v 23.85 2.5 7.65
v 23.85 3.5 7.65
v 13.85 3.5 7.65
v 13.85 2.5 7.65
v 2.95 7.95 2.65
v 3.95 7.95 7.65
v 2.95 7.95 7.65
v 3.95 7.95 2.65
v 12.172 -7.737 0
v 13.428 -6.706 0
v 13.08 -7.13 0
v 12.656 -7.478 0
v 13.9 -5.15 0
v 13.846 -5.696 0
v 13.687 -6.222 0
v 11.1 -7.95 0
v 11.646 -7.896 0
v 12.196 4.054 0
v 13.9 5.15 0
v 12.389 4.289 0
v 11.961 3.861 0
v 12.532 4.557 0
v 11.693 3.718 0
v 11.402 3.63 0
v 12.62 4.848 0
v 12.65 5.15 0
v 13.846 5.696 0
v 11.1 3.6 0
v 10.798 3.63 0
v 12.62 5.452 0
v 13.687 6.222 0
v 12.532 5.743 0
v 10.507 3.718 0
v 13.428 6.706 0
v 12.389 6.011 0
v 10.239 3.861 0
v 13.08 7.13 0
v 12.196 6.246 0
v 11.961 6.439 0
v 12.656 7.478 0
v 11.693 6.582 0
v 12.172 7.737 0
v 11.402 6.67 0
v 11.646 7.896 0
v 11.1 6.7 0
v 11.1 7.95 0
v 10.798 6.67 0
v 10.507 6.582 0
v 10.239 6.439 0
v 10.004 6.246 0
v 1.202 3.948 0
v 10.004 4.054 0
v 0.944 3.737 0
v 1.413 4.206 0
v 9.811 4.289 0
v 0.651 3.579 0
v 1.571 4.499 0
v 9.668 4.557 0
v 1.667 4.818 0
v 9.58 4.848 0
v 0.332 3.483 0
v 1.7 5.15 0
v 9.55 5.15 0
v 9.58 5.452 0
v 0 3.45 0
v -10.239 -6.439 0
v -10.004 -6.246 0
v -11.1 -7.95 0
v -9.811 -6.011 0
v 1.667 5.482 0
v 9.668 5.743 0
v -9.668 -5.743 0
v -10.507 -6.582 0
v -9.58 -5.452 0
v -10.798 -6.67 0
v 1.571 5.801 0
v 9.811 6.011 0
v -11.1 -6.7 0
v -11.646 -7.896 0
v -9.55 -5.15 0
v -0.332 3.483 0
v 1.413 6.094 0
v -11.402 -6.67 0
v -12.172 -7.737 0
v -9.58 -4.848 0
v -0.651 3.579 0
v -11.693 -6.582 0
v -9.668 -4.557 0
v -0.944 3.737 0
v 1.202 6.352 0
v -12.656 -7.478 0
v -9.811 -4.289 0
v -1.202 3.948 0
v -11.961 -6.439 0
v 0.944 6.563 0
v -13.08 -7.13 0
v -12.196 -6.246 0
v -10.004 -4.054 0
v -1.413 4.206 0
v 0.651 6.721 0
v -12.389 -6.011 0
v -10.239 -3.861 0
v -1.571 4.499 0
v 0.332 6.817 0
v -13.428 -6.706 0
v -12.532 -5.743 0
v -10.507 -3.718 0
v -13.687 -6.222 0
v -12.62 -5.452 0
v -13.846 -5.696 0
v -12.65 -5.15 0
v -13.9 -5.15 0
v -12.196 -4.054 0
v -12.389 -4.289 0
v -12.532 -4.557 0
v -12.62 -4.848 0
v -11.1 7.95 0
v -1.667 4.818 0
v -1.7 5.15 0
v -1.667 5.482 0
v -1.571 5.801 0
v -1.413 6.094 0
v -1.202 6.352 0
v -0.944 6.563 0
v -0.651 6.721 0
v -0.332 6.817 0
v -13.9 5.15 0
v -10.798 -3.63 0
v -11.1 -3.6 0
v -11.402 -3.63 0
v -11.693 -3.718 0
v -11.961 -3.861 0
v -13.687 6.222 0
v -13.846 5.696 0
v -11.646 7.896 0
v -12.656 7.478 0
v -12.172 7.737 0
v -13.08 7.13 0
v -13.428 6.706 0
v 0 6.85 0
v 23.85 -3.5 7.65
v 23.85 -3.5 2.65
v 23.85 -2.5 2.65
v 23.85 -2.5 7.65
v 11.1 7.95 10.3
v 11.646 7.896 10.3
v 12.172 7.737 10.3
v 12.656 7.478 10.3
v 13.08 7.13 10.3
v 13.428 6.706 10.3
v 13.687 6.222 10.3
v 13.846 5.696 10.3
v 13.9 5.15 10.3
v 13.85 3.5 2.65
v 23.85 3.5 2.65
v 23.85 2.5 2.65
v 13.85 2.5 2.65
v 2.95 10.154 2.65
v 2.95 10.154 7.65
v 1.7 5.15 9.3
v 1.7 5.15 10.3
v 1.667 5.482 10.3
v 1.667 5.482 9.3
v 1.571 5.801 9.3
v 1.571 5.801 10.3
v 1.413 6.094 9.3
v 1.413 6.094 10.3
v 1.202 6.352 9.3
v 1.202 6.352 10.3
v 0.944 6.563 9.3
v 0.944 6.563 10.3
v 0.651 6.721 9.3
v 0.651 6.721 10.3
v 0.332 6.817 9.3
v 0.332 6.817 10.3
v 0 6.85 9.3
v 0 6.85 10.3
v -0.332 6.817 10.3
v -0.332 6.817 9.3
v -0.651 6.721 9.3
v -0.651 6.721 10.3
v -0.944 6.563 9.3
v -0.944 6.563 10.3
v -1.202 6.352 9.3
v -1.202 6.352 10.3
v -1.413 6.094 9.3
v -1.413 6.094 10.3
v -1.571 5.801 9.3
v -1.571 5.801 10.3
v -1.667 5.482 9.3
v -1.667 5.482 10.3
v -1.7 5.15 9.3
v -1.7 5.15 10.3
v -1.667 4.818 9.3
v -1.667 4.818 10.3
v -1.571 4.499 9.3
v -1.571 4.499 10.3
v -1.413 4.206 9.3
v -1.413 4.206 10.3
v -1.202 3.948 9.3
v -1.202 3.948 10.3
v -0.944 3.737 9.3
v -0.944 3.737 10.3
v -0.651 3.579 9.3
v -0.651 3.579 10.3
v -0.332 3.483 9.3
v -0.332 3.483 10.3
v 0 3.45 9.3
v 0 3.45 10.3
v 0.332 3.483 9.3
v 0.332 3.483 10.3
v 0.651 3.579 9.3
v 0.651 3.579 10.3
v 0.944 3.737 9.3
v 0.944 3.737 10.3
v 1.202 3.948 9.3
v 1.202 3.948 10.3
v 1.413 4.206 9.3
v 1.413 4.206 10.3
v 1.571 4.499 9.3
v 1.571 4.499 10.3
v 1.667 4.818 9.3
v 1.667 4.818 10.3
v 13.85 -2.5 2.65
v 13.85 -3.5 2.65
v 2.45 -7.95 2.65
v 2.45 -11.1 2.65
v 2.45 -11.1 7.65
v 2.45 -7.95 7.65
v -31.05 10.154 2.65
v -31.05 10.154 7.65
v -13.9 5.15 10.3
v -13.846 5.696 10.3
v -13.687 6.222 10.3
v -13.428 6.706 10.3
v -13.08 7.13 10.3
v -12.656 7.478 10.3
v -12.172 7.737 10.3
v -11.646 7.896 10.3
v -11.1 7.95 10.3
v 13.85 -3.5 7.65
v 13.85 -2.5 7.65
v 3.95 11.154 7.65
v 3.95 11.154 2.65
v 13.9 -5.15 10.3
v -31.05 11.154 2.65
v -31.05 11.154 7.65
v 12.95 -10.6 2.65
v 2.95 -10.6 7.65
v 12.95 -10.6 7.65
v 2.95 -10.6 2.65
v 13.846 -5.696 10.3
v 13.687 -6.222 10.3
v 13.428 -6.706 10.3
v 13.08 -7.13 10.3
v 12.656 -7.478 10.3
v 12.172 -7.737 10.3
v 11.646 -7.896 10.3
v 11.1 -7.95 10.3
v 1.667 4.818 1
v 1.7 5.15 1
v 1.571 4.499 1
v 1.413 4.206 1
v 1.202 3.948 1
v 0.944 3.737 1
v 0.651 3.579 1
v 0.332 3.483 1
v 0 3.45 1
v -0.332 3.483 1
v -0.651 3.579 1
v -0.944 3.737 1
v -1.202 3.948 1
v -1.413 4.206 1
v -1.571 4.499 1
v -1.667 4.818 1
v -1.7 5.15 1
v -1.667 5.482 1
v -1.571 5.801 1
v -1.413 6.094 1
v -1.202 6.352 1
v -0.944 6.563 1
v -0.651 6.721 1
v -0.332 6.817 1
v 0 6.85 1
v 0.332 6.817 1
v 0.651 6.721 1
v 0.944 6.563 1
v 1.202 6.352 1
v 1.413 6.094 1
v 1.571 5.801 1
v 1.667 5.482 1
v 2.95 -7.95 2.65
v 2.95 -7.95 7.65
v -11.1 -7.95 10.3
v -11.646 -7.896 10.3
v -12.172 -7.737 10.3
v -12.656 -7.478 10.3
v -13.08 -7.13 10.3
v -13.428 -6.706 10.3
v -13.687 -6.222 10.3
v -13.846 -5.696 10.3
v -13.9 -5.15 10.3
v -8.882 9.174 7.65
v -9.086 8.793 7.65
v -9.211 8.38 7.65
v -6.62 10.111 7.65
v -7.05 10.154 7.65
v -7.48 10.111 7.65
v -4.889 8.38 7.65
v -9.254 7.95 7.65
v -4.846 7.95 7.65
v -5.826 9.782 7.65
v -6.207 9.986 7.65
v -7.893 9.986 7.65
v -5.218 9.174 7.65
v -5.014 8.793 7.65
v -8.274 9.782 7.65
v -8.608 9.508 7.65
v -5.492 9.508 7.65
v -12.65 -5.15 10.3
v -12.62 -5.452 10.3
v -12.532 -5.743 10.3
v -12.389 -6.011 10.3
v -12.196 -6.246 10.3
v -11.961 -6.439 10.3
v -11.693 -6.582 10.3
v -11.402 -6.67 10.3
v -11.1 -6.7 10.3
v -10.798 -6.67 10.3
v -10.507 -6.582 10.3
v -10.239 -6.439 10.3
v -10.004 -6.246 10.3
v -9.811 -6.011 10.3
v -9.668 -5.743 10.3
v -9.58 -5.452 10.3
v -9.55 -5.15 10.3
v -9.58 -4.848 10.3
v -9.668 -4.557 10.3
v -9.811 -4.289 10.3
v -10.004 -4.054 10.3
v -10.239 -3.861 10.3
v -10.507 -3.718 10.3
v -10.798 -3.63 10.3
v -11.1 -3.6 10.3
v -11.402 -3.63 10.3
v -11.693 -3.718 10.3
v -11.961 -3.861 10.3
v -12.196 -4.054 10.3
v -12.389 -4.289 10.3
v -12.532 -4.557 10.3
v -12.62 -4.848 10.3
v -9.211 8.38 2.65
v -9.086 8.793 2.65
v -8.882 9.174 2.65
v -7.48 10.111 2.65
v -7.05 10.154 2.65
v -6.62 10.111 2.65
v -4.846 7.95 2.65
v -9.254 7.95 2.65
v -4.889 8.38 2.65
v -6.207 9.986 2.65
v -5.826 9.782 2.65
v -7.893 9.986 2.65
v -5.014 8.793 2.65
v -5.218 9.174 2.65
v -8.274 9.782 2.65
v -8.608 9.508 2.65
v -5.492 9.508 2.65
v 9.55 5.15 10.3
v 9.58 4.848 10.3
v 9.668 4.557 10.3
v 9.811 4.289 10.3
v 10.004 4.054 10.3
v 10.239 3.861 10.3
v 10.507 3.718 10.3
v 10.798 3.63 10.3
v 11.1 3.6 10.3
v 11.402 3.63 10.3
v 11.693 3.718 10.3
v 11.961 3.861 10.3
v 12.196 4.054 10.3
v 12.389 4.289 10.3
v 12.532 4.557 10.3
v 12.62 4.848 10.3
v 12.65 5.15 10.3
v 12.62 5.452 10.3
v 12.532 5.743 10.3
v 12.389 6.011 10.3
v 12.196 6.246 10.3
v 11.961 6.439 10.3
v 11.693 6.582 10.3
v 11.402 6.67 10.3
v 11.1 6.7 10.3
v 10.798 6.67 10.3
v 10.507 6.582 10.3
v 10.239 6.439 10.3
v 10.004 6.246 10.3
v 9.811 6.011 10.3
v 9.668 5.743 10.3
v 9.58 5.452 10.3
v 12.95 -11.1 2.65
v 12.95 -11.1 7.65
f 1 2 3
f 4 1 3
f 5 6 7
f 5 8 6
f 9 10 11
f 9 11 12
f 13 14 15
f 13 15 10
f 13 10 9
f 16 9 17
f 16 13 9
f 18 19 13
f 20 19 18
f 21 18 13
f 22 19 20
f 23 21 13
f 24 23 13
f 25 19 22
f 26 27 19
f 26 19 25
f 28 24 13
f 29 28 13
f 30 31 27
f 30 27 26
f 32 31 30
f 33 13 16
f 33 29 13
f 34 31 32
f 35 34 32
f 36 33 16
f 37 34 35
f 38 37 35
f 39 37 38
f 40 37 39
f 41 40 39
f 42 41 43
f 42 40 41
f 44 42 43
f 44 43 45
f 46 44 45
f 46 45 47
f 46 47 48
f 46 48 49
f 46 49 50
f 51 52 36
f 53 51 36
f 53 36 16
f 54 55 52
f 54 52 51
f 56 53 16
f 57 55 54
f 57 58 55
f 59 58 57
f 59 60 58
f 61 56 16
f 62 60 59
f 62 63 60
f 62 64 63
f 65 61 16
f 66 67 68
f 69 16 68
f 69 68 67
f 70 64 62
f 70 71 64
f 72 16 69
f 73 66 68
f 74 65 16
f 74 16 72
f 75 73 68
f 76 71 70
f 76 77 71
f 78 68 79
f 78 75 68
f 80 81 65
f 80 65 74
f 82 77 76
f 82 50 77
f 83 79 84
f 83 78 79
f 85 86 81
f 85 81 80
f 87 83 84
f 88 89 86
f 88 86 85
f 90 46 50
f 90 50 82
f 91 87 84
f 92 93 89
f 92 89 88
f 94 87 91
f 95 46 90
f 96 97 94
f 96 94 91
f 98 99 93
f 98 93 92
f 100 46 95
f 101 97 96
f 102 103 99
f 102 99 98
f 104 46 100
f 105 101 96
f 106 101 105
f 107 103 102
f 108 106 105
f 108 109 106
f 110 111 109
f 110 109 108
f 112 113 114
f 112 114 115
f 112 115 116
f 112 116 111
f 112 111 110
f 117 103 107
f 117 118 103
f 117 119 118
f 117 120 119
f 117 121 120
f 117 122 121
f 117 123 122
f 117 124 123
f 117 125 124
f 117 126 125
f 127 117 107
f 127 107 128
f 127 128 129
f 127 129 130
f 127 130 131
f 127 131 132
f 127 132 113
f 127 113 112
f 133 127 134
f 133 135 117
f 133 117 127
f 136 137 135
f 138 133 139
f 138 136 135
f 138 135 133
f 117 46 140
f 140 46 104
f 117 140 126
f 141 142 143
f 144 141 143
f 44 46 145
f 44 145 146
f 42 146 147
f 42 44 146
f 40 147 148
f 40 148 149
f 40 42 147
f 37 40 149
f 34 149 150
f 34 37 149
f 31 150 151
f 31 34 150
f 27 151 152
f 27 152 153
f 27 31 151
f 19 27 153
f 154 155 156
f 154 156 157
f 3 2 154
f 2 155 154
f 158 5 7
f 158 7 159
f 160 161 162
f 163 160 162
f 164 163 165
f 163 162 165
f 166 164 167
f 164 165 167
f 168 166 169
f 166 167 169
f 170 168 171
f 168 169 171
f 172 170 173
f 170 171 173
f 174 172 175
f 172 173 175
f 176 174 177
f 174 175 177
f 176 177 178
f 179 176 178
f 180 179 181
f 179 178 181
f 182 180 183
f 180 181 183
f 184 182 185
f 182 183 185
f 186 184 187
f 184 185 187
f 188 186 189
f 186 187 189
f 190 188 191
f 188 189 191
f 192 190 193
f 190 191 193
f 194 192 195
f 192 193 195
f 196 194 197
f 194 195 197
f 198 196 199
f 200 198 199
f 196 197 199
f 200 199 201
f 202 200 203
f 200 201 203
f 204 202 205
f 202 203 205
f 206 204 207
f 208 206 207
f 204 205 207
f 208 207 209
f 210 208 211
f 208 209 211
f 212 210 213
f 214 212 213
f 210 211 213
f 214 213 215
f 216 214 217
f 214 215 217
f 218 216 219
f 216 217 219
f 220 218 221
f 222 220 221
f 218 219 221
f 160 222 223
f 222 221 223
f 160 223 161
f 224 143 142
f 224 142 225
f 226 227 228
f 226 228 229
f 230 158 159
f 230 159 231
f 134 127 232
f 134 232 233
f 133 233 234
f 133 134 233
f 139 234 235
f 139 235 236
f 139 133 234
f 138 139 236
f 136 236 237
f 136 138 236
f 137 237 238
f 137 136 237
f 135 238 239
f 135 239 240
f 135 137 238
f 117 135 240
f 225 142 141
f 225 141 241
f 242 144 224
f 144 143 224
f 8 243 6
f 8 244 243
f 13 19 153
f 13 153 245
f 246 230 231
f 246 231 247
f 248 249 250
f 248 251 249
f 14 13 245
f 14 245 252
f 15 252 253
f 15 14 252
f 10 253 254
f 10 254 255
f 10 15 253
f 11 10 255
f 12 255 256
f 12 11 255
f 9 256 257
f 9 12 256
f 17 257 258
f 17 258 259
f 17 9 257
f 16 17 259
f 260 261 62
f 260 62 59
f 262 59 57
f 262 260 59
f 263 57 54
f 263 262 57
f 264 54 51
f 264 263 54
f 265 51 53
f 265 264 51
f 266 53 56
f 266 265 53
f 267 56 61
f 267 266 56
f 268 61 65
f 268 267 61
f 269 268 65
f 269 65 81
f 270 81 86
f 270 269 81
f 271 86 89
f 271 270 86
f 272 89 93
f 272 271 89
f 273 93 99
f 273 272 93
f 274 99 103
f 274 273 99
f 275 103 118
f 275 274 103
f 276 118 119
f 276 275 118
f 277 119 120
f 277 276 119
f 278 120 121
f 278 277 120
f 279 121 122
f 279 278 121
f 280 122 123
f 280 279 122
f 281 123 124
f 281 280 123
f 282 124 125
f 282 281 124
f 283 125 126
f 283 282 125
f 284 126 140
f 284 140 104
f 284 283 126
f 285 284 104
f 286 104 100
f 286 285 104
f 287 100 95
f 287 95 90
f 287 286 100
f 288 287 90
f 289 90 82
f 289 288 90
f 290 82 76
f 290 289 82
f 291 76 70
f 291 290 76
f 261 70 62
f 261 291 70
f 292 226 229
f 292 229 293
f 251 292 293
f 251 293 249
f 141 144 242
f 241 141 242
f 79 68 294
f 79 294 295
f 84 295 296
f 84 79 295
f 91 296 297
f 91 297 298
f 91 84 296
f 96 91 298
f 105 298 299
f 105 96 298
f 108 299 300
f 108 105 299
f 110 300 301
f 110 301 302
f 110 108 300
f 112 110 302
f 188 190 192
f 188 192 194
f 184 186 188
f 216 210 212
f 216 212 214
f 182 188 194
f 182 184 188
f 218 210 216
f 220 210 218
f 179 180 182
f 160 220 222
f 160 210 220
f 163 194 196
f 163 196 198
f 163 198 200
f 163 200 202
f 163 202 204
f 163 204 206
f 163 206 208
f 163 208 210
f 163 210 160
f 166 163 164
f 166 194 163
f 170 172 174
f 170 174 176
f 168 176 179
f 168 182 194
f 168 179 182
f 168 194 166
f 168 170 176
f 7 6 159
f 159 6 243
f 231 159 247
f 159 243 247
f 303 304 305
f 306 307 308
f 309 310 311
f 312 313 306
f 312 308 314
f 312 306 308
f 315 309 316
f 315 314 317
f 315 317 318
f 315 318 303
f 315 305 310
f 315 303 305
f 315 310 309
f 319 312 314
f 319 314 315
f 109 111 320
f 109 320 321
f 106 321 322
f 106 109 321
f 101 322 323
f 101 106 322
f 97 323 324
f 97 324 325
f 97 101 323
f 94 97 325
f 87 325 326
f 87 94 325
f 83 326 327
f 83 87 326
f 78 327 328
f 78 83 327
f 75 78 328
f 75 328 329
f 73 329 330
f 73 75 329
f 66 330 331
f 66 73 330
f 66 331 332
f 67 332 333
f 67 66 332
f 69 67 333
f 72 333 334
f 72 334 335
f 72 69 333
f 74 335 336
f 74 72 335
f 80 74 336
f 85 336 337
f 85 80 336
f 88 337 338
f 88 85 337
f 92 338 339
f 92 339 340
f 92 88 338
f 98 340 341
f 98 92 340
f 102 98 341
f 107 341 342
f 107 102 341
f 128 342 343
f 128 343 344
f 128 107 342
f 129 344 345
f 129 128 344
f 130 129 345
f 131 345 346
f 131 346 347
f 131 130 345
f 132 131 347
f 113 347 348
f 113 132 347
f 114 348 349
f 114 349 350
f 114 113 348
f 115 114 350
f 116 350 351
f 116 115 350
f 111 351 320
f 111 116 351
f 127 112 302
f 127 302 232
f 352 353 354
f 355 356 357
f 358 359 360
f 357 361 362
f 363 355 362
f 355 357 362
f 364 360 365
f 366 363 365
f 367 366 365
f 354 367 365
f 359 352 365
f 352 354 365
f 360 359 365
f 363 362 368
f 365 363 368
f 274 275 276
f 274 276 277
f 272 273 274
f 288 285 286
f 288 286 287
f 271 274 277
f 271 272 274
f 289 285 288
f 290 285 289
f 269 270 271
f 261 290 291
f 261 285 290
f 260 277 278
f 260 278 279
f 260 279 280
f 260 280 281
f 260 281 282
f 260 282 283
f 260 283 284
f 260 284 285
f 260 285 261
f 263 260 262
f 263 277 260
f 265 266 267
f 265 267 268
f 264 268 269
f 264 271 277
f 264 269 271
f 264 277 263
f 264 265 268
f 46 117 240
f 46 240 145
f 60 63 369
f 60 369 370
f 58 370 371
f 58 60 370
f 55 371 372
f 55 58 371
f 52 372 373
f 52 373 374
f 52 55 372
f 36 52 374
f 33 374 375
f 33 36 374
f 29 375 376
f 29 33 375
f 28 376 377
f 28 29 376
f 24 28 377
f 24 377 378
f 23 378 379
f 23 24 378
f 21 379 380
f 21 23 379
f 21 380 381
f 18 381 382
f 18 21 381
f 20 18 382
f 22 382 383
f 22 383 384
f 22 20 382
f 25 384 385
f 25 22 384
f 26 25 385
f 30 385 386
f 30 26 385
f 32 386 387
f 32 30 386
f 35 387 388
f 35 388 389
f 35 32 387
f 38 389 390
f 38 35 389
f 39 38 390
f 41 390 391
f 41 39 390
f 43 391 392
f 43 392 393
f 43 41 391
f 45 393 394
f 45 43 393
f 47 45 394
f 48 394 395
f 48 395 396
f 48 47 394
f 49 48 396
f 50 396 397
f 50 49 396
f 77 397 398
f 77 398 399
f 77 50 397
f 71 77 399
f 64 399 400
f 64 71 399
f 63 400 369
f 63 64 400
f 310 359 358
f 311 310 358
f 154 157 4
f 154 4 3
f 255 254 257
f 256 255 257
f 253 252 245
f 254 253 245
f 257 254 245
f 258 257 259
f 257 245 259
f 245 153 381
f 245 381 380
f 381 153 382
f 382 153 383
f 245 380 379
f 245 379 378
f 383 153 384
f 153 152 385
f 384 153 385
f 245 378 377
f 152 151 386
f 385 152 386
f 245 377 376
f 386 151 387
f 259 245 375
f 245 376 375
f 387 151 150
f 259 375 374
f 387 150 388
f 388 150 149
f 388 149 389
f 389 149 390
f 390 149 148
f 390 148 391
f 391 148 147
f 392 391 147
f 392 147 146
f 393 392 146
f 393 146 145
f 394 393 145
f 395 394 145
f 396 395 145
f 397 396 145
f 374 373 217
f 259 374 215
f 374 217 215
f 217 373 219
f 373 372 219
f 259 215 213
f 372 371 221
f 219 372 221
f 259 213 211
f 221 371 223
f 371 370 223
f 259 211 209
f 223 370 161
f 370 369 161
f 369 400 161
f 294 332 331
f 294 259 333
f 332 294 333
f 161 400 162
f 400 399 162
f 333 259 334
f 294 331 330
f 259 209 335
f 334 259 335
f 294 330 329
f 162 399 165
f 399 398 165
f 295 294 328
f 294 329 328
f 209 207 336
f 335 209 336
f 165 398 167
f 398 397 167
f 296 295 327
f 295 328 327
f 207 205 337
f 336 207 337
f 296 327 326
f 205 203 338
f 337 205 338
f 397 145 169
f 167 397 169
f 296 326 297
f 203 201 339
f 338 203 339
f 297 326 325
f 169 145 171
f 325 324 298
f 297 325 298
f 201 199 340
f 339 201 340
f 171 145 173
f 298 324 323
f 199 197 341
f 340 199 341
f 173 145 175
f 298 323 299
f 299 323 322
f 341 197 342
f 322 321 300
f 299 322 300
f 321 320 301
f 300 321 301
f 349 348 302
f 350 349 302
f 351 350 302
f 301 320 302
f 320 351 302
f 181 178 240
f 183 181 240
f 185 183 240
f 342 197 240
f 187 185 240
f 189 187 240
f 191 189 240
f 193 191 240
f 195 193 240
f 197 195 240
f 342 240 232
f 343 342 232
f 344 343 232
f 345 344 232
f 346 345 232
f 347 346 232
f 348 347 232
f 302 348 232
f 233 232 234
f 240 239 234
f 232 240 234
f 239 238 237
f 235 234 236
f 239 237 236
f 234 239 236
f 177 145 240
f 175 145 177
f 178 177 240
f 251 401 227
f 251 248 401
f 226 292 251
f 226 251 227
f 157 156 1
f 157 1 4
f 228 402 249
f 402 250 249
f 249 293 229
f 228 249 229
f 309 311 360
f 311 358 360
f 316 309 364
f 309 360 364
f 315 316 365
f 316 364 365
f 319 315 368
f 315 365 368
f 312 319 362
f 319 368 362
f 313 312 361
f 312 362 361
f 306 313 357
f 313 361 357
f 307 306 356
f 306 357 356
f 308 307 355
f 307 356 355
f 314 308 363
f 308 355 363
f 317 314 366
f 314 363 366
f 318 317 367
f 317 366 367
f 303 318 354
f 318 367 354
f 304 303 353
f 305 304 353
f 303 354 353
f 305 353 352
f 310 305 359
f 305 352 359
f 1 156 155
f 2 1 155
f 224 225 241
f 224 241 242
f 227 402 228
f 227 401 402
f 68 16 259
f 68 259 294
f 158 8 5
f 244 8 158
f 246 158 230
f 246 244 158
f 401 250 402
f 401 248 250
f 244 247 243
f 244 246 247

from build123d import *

# Parameters (mm, degrees)
CROQUIS1_R                = 1.55
SALIENTE_EXTRUIR1_DEPTH   = 10.3
CROQUIS2_R                = 1.7
CORTAR_EXTRUIR1_DEPTH     = 1
CORTAR_EXTRUIR2_START     = -1
CROQUIS3_R                = 1.7
CORTAR_EXTRUIR2_DEPTH     = 1
SALIENTE_EXTRUIR2_DEPTH   = 2.5
SALIENTE_EXTRUIR2_2_DEPTH = 2.5
CROQUIS4_W                = 10
CROQUIS4_H                = 1
SALIENTE_EXTRUIR2_3_DEPTH = 2.5
SALIENTE_EXTRUIR2_4_DEPTH = 2.5
SALIENTE_EXTRUIR2_5_DEPTH = 2.5


with BuildPart() as part:
    # Croquis1 → Saliente-Extruir1 (new body)
    with BuildSketch(Plane.XY):
        with BuildLine():
            Line((-11.1, 7.95), (11.1, 7.95))
            ThreePointArc((11.1, 7.95), (13.079898987, 7.129898987), (13.9, 5.15))
            Line((13.9, 5.15), (13.9, -5.15))
            ThreePointArc((13.9, -5.15), (13.079898987, -7.129898987), (11.1, -7.95))
            Line((11.1, -7.95), (-11.1, -7.95))
            ThreePointArc((-11.1, -7.95), (-13.079898987, -7.129898987), (-13.9, -5.15))
            Line((-13.9, -5.15), (-13.9, 5.15))
            ThreePointArc((-13.9, 5.15), (-13.079898987, 7.129898987), (-11.1, 7.95))
        make_face()
        with Locations(Location((11.1, 5.15, 0), (0, 0, 180))):
            Circle(CROQUIS1_R, mode=Mode.SUBTRACT)
        with Locations(Location((-11.1, -5.15, 0), (0, 0, 180))):
            Circle(CROQUIS1_R, mode=Mode.SUBTRACT)
    extrude(amount=SALIENTE_EXTRUIR1_DEPTH)

    # Croquis2 → Cortar-Extruir1 (cut)
    with BuildSketch(Plane.XY.offset(10.3)):
        with Locations((0, 5.15)):
            Circle(CROQUIS2_R)
    extrude(amount=-CORTAR_EXTRUIR1_DEPTH, mode=Mode.SUBTRACT)

    # Croquis3 → Cortar-Extruir2 (cut)
    with BuildSketch(Plane(origin=(0, 0, 0), x_dir=(-1, 0, 0), z_dir=(0, 0, -1)).offset(CORTAR_EXTRUIR2_START)):
        with Locations(Location((0, 5.15, 0), (0, 0, 180))):
            Circle(CROQUIS3_R)
    extrude(amount=CORTAR_EXTRUIR2_DEPTH, mode=Mode.SUBTRACT)


with BuildPart() as body_2:
    # Croquis4 → Saliente-Extruir2 (new, symmetric)
    with BuildSketch(Plane(origin=(0, 0, 5.15), x_dir=(-1, 0, 0), z_dir=(0, 0, -1))):
        Polygon((-3.95, 7.95), (-2.95, 7.95), (-2.95, 10.153629865), (31.05, 10.153629865), (31.05, 11.153629865), (-3.95, 11.153629865), align=None)
    extrude(amount=SALIENTE_EXTRUIR2_DEPTH, both=True)


with BuildPart() as body_3:
    # Croquis4 → Saliente-Extruir2 2 (new, symmetric)
    with BuildSketch(Plane(origin=(0, 0, 5.15), x_dir=(-1, 0, 0), z_dir=(0, 0, -1))):
        with BuildLine():
            Line((9.253629865, 7.95), (4.846370135, 7.95))
            ThreePointArc((4.846370135, 7.95), (7.05, 10.153629865), (9.253629865, 7.95))
        make_face()
    extrude(amount=SALIENTE_EXTRUIR2_2_DEPTH, both=True)


with BuildPart() as body_4:
    # Croquis4 → Saliente-Extruir2 3 (new, symmetric)
    with BuildSketch(Plane(origin=(0, 0, 5.15), x_dir=(-1, 0, 0), z_dir=(0, 0, -1))):
        with Locations((-18.85, 3)):
            Rectangle(CROQUIS4_W, CROQUIS4_H)
    extrude(amount=SALIENTE_EXTRUIR2_3_DEPTH, both=True)


with BuildPart() as body_5:
    # Croquis4 → Saliente-Extruir2 4 (new, symmetric)
    with BuildSketch(Plane(origin=(0, 0, 5.15), x_dir=(-1, 0, 0), z_dir=(0, 0, -1))):
        with Locations((-18.85, -3)):
            Rectangle(CROQUIS4_W, CROQUIS4_H)
    extrude(amount=SALIENTE_EXTRUIR2_4_DEPTH, both=True)


with BuildPart() as body_6:
    # Croquis4 → Saliente-Extruir2 5 (new, symmetric)
    with BuildSketch(Plane(origin=(0, 0, 5.15), x_dir=(-1, 0, 0), z_dir=(0, 0, -1))):
        Polygon((-12.95, -11.1), (-2.45, -11.1), (-2.45, -7.95), (-2.95, -7.95), (-2.95, -10.6), (-12.95, -10.6), align=None)
    extrude(amount=SALIENTE_EXTRUIR2_5_DEPTH, both=True)


solid = Compound([part.part, body_2.part, body_3.part, body_4.part, body_5.part, body_6.part])
